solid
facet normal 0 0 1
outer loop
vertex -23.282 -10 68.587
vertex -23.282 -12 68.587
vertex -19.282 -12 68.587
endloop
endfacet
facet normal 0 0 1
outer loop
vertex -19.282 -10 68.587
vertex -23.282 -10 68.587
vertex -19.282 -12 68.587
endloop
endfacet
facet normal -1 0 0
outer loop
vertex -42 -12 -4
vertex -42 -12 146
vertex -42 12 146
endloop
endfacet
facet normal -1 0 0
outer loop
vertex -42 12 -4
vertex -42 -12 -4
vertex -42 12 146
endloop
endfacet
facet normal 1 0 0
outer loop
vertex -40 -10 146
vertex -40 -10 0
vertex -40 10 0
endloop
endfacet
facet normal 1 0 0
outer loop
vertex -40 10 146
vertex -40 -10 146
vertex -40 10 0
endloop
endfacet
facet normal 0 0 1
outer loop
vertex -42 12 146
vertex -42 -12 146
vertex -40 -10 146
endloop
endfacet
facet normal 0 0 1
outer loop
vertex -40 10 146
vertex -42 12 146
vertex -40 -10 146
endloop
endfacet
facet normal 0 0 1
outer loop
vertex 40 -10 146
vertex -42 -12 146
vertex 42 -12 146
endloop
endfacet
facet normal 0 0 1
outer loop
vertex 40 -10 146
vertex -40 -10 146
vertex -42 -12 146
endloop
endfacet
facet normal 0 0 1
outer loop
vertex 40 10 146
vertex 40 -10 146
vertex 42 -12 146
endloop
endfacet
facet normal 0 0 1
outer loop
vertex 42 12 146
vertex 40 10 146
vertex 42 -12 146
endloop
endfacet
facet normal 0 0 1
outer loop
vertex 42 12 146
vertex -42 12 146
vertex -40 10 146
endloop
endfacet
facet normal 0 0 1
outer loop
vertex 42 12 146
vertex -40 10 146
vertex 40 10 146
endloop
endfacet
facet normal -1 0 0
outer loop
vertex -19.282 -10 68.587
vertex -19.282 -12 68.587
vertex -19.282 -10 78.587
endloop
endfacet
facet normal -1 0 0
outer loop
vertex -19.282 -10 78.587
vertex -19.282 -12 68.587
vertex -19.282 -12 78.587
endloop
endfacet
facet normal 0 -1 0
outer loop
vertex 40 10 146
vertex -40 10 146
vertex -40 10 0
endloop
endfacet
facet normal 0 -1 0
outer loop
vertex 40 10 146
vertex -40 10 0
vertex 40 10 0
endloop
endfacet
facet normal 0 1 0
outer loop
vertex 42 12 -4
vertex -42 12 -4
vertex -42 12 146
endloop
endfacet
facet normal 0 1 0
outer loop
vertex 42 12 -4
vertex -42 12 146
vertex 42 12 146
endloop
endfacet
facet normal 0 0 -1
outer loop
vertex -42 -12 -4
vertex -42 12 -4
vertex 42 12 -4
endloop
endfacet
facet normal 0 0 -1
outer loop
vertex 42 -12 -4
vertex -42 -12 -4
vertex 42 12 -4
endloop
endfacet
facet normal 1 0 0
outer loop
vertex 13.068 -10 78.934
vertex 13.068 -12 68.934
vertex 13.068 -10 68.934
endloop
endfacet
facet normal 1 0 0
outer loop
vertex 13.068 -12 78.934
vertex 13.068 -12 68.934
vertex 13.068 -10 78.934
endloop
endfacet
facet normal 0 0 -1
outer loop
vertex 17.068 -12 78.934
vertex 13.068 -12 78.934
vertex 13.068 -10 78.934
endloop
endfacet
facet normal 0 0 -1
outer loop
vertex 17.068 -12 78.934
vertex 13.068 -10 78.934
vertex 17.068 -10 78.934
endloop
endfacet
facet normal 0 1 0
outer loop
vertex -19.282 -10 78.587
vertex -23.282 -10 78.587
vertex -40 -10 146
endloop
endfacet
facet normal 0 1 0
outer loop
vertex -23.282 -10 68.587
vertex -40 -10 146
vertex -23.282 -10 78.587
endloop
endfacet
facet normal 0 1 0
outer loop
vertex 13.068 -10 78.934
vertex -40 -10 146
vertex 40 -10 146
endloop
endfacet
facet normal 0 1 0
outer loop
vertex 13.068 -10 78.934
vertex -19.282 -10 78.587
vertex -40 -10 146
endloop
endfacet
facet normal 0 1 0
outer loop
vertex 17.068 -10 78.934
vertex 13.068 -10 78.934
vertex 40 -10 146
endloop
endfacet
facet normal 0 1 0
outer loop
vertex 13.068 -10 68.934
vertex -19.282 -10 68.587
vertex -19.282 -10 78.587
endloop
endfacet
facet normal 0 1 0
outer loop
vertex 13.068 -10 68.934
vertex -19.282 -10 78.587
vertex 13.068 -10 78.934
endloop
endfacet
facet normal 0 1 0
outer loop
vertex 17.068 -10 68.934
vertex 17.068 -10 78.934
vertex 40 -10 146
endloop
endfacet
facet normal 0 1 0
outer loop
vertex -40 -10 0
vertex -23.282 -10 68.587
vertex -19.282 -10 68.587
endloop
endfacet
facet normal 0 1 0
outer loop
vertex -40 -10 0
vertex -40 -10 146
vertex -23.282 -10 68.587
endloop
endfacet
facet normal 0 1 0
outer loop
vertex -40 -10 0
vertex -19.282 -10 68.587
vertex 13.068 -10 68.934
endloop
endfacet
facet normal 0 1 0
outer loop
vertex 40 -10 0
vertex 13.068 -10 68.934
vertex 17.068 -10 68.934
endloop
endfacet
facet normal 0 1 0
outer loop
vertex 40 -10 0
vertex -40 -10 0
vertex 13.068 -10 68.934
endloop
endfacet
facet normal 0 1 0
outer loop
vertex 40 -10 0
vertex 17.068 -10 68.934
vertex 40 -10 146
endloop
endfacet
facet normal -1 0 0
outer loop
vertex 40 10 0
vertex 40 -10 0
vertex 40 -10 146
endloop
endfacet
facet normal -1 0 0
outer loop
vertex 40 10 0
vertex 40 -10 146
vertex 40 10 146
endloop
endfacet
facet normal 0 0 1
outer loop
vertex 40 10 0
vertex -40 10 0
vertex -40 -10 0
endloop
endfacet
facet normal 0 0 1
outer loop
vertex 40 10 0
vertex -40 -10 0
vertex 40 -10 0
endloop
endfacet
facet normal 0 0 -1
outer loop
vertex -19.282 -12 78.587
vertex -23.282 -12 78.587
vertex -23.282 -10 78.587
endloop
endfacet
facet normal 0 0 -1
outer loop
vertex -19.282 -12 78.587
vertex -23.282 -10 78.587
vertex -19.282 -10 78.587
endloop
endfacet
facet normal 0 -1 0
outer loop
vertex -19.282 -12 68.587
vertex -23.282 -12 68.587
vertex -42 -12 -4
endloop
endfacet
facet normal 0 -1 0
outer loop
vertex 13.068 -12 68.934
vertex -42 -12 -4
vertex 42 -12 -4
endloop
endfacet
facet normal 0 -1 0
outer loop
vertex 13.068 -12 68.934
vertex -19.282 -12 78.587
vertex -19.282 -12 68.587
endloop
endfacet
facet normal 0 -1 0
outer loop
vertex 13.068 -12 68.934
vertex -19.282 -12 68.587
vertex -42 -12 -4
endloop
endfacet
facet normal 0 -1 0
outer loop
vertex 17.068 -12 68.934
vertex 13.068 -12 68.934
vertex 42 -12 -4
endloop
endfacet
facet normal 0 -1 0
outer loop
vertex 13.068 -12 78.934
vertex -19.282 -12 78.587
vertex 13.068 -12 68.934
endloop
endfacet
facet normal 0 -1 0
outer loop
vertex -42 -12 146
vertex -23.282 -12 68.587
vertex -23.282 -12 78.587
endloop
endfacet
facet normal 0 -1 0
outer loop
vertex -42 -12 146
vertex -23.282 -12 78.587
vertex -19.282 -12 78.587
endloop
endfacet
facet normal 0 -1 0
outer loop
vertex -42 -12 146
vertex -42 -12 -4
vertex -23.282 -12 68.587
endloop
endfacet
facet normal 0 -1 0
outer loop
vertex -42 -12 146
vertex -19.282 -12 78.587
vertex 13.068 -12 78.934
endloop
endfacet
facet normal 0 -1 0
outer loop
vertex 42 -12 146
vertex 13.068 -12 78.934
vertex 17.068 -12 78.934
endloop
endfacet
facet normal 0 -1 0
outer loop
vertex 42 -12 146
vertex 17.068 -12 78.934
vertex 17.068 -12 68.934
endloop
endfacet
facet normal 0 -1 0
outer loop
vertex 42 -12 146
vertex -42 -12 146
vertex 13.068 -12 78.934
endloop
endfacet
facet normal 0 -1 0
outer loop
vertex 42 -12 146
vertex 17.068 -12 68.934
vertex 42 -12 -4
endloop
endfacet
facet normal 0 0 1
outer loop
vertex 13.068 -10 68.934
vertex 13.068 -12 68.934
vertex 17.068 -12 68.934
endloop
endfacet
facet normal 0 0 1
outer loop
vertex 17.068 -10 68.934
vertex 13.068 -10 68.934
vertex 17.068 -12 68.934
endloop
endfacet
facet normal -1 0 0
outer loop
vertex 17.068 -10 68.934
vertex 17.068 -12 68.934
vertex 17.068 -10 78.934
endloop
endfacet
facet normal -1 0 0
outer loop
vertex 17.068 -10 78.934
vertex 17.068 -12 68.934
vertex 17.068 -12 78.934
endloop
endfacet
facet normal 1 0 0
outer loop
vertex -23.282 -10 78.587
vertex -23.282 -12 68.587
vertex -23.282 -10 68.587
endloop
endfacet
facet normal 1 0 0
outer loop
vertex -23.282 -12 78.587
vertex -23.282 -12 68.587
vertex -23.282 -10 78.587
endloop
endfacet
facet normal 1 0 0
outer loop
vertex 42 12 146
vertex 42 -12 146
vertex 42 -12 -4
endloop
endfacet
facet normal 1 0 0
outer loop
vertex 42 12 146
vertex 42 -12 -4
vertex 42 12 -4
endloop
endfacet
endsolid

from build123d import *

# Parameters (mm, degrees)
F1_W     = 84
F1_H     = 24
F2_DEPTH = 146
F3_DEPTH = 4
F0_W     = 80
F0_H     = 20
F4_DEPTH = 146
F5_W     = 4
F5_H     = 10
F6_DEPTH = 3.9


with BuildPart() as f2:
    # F1 (on Top) → F2 (new body)
    with BuildSketch(Plane.XY):
        Rectangle(F1_W, F1_H)
    extrude(amount=F2_DEPTH)

    # F1 (on Top) → F3 (join)
    with BuildSketch(Plane.XY):
        Rectangle(F1_W, F1_H)
    extrude(amount=-F3_DEPTH)

    # F0 (on Top) → F4 (cut)
    with BuildSketch(Plane.XY):
        Rectangle(F0_W, F0_H)
    extrude(amount=F4_DEPTH, mode=Mode.SUBTRACT)

    # F5 (on face) → F6 (cut)
    with BuildSketch(Plane.XZ.offset(12)):
        with Locations((-21.282188, 73.58651)):
            Rectangle(F5_W, F5_H)
        with Locations((15.067677, 73.934341)):
            Rectangle(F5_W, F5_H)
    extrude(amount=-F6_DEPTH, mode=Mode.SUBTRACT)


solid = f2.part
